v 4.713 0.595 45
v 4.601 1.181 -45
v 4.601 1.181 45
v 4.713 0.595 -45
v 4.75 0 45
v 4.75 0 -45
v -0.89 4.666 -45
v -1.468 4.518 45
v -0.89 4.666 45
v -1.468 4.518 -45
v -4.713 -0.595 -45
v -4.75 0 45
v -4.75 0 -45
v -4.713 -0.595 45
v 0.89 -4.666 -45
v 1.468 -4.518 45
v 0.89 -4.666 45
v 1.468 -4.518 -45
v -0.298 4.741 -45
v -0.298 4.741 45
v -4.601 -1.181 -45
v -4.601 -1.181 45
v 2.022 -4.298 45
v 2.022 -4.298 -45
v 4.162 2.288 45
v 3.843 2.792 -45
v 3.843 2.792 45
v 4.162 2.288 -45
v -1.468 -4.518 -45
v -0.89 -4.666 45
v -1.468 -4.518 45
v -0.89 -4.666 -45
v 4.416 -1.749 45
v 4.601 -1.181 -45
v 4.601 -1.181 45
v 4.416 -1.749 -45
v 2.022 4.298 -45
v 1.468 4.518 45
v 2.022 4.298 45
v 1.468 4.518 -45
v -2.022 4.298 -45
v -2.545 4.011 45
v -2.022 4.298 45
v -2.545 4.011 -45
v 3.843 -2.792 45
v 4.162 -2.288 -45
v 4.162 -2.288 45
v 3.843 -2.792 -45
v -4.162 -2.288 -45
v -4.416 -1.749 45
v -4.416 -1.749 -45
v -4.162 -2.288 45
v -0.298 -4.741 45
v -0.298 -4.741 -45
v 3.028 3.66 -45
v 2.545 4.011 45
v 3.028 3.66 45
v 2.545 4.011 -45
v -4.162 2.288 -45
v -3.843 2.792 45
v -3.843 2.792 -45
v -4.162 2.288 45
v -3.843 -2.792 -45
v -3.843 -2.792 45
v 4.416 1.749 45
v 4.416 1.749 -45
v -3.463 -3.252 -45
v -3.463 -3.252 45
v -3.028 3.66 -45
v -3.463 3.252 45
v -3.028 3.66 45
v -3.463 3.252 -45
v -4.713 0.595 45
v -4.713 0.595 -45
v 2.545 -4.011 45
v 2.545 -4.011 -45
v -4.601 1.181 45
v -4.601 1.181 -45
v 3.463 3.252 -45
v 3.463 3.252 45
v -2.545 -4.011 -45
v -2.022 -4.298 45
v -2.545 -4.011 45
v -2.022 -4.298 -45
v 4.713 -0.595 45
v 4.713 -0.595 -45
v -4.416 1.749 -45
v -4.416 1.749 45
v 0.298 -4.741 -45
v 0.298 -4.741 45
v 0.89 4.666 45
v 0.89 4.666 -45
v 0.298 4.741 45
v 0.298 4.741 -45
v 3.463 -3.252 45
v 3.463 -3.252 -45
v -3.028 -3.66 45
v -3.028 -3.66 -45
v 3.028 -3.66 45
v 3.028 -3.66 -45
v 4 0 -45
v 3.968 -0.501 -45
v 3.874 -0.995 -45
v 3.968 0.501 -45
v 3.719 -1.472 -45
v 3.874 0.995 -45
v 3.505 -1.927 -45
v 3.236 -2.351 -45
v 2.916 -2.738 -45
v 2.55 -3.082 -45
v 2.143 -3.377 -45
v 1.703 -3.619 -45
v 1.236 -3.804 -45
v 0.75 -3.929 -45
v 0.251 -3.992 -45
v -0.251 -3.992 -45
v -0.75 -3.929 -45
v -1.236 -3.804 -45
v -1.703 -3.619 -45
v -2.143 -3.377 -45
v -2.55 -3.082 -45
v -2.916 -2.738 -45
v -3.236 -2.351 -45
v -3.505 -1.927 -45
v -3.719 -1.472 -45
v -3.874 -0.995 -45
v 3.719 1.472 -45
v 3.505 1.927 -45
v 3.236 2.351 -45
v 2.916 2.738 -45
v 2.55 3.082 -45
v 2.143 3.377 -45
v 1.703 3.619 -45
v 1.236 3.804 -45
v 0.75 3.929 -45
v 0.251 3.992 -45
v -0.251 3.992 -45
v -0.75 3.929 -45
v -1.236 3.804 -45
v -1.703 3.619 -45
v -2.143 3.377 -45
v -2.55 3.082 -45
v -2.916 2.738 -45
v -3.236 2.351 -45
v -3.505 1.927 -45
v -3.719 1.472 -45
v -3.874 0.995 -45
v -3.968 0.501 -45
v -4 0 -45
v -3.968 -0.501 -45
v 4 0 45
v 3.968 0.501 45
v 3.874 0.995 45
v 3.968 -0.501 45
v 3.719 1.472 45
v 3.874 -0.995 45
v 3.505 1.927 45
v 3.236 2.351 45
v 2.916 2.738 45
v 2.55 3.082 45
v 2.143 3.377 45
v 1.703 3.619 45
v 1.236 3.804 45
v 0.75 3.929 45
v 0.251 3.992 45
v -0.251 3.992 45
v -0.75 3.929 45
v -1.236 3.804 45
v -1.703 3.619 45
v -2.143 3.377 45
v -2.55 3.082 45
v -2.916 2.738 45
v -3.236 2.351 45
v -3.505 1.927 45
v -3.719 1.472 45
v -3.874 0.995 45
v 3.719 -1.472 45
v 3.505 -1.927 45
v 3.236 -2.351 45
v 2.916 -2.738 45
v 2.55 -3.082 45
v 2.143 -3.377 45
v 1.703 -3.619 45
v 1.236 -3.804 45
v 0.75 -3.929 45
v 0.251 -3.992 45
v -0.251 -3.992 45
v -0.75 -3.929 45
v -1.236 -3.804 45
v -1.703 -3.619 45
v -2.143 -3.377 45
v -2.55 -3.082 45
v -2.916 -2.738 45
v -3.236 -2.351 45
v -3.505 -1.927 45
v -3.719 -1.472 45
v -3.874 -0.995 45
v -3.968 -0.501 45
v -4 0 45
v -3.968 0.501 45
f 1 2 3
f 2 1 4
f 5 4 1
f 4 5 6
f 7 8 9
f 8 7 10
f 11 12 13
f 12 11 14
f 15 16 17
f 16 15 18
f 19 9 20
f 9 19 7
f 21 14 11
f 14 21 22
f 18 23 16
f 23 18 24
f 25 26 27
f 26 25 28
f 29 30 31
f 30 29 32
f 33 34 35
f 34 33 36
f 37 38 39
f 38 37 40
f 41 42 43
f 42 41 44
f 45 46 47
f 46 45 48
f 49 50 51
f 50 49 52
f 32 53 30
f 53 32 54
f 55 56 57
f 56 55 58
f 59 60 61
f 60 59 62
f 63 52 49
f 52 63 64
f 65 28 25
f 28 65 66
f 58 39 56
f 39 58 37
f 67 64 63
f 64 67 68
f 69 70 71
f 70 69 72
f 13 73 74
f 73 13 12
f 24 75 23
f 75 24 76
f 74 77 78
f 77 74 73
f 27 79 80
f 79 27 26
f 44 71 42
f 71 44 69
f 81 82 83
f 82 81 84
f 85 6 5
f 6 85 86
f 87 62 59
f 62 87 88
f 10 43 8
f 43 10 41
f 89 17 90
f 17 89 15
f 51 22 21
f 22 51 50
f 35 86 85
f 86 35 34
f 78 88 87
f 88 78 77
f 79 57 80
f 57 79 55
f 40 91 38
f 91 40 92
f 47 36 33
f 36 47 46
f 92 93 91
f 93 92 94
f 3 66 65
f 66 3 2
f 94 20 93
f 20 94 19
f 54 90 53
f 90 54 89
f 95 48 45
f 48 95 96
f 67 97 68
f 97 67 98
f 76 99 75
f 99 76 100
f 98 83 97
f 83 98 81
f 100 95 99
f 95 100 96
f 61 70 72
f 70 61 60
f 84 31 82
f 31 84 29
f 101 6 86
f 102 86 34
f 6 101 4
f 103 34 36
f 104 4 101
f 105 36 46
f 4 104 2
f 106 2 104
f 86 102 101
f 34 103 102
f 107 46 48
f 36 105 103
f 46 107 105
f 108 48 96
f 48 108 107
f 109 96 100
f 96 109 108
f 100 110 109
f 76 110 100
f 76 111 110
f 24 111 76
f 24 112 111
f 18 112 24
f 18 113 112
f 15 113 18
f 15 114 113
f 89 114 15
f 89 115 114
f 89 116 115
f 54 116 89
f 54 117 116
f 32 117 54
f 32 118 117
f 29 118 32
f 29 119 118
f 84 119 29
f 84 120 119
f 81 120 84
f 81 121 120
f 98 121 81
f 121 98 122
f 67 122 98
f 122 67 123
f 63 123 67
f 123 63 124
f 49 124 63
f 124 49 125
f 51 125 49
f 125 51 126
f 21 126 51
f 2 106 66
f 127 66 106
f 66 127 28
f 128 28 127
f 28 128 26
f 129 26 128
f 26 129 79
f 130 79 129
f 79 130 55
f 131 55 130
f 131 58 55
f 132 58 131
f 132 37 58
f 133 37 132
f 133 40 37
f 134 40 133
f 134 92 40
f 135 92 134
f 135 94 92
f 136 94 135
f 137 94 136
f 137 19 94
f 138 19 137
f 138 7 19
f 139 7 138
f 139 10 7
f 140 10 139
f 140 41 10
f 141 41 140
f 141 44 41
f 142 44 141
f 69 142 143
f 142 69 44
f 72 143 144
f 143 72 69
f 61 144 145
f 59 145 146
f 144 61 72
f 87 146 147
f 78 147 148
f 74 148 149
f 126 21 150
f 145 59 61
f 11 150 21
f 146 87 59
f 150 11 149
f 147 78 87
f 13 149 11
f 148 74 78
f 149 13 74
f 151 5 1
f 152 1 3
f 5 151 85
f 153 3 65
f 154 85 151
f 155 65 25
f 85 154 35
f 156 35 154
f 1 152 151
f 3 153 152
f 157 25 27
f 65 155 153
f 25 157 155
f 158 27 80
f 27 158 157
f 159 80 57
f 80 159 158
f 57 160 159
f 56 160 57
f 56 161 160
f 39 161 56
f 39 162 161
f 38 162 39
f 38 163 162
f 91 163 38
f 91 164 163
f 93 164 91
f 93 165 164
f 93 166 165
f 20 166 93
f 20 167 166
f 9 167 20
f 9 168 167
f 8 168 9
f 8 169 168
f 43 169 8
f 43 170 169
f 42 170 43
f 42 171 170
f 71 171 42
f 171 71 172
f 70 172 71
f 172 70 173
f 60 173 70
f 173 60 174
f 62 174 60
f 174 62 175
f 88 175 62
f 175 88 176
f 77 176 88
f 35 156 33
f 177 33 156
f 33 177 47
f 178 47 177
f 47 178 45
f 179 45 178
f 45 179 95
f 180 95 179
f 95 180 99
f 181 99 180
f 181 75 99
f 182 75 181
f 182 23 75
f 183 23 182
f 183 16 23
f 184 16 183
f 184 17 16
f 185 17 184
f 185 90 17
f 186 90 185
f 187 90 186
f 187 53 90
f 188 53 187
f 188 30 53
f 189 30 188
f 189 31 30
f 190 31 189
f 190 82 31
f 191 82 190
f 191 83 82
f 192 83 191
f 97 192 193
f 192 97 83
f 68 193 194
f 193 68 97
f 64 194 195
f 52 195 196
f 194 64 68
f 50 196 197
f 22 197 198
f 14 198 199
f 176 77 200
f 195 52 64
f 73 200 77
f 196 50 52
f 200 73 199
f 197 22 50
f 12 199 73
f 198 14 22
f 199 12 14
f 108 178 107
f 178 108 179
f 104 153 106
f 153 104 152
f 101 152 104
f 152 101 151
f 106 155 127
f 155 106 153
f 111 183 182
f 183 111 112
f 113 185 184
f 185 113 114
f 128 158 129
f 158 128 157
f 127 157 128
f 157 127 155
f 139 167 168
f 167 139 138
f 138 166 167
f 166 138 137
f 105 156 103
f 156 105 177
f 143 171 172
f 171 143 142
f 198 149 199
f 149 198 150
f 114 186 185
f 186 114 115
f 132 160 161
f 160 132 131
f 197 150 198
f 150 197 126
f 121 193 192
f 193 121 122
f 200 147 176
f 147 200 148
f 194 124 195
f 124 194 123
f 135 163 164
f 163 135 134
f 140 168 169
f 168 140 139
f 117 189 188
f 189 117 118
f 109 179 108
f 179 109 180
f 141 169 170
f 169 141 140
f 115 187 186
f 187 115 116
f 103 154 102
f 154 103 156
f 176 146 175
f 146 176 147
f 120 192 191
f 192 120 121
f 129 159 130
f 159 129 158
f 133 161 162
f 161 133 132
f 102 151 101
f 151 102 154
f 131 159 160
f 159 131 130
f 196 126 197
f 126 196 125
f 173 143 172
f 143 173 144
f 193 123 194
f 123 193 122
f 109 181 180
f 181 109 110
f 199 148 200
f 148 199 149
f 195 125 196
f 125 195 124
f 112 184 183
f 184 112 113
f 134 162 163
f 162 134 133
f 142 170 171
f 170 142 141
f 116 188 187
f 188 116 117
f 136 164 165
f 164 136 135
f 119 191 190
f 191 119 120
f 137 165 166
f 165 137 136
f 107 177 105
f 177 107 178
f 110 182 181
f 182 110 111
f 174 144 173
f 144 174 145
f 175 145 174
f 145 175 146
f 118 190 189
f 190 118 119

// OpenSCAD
$fn = 50;


difference() {
	union() {
		translate(v = [0, 0, -45.0000000000]) {
			cylinder(h = 90, r = 4.7500000000);
		}
	}
	union() {
		translate(v = [0, 0, -100.0000000000]) {
			cylinder(h = 200, r = 4.0000000000);
		}
	}
}
